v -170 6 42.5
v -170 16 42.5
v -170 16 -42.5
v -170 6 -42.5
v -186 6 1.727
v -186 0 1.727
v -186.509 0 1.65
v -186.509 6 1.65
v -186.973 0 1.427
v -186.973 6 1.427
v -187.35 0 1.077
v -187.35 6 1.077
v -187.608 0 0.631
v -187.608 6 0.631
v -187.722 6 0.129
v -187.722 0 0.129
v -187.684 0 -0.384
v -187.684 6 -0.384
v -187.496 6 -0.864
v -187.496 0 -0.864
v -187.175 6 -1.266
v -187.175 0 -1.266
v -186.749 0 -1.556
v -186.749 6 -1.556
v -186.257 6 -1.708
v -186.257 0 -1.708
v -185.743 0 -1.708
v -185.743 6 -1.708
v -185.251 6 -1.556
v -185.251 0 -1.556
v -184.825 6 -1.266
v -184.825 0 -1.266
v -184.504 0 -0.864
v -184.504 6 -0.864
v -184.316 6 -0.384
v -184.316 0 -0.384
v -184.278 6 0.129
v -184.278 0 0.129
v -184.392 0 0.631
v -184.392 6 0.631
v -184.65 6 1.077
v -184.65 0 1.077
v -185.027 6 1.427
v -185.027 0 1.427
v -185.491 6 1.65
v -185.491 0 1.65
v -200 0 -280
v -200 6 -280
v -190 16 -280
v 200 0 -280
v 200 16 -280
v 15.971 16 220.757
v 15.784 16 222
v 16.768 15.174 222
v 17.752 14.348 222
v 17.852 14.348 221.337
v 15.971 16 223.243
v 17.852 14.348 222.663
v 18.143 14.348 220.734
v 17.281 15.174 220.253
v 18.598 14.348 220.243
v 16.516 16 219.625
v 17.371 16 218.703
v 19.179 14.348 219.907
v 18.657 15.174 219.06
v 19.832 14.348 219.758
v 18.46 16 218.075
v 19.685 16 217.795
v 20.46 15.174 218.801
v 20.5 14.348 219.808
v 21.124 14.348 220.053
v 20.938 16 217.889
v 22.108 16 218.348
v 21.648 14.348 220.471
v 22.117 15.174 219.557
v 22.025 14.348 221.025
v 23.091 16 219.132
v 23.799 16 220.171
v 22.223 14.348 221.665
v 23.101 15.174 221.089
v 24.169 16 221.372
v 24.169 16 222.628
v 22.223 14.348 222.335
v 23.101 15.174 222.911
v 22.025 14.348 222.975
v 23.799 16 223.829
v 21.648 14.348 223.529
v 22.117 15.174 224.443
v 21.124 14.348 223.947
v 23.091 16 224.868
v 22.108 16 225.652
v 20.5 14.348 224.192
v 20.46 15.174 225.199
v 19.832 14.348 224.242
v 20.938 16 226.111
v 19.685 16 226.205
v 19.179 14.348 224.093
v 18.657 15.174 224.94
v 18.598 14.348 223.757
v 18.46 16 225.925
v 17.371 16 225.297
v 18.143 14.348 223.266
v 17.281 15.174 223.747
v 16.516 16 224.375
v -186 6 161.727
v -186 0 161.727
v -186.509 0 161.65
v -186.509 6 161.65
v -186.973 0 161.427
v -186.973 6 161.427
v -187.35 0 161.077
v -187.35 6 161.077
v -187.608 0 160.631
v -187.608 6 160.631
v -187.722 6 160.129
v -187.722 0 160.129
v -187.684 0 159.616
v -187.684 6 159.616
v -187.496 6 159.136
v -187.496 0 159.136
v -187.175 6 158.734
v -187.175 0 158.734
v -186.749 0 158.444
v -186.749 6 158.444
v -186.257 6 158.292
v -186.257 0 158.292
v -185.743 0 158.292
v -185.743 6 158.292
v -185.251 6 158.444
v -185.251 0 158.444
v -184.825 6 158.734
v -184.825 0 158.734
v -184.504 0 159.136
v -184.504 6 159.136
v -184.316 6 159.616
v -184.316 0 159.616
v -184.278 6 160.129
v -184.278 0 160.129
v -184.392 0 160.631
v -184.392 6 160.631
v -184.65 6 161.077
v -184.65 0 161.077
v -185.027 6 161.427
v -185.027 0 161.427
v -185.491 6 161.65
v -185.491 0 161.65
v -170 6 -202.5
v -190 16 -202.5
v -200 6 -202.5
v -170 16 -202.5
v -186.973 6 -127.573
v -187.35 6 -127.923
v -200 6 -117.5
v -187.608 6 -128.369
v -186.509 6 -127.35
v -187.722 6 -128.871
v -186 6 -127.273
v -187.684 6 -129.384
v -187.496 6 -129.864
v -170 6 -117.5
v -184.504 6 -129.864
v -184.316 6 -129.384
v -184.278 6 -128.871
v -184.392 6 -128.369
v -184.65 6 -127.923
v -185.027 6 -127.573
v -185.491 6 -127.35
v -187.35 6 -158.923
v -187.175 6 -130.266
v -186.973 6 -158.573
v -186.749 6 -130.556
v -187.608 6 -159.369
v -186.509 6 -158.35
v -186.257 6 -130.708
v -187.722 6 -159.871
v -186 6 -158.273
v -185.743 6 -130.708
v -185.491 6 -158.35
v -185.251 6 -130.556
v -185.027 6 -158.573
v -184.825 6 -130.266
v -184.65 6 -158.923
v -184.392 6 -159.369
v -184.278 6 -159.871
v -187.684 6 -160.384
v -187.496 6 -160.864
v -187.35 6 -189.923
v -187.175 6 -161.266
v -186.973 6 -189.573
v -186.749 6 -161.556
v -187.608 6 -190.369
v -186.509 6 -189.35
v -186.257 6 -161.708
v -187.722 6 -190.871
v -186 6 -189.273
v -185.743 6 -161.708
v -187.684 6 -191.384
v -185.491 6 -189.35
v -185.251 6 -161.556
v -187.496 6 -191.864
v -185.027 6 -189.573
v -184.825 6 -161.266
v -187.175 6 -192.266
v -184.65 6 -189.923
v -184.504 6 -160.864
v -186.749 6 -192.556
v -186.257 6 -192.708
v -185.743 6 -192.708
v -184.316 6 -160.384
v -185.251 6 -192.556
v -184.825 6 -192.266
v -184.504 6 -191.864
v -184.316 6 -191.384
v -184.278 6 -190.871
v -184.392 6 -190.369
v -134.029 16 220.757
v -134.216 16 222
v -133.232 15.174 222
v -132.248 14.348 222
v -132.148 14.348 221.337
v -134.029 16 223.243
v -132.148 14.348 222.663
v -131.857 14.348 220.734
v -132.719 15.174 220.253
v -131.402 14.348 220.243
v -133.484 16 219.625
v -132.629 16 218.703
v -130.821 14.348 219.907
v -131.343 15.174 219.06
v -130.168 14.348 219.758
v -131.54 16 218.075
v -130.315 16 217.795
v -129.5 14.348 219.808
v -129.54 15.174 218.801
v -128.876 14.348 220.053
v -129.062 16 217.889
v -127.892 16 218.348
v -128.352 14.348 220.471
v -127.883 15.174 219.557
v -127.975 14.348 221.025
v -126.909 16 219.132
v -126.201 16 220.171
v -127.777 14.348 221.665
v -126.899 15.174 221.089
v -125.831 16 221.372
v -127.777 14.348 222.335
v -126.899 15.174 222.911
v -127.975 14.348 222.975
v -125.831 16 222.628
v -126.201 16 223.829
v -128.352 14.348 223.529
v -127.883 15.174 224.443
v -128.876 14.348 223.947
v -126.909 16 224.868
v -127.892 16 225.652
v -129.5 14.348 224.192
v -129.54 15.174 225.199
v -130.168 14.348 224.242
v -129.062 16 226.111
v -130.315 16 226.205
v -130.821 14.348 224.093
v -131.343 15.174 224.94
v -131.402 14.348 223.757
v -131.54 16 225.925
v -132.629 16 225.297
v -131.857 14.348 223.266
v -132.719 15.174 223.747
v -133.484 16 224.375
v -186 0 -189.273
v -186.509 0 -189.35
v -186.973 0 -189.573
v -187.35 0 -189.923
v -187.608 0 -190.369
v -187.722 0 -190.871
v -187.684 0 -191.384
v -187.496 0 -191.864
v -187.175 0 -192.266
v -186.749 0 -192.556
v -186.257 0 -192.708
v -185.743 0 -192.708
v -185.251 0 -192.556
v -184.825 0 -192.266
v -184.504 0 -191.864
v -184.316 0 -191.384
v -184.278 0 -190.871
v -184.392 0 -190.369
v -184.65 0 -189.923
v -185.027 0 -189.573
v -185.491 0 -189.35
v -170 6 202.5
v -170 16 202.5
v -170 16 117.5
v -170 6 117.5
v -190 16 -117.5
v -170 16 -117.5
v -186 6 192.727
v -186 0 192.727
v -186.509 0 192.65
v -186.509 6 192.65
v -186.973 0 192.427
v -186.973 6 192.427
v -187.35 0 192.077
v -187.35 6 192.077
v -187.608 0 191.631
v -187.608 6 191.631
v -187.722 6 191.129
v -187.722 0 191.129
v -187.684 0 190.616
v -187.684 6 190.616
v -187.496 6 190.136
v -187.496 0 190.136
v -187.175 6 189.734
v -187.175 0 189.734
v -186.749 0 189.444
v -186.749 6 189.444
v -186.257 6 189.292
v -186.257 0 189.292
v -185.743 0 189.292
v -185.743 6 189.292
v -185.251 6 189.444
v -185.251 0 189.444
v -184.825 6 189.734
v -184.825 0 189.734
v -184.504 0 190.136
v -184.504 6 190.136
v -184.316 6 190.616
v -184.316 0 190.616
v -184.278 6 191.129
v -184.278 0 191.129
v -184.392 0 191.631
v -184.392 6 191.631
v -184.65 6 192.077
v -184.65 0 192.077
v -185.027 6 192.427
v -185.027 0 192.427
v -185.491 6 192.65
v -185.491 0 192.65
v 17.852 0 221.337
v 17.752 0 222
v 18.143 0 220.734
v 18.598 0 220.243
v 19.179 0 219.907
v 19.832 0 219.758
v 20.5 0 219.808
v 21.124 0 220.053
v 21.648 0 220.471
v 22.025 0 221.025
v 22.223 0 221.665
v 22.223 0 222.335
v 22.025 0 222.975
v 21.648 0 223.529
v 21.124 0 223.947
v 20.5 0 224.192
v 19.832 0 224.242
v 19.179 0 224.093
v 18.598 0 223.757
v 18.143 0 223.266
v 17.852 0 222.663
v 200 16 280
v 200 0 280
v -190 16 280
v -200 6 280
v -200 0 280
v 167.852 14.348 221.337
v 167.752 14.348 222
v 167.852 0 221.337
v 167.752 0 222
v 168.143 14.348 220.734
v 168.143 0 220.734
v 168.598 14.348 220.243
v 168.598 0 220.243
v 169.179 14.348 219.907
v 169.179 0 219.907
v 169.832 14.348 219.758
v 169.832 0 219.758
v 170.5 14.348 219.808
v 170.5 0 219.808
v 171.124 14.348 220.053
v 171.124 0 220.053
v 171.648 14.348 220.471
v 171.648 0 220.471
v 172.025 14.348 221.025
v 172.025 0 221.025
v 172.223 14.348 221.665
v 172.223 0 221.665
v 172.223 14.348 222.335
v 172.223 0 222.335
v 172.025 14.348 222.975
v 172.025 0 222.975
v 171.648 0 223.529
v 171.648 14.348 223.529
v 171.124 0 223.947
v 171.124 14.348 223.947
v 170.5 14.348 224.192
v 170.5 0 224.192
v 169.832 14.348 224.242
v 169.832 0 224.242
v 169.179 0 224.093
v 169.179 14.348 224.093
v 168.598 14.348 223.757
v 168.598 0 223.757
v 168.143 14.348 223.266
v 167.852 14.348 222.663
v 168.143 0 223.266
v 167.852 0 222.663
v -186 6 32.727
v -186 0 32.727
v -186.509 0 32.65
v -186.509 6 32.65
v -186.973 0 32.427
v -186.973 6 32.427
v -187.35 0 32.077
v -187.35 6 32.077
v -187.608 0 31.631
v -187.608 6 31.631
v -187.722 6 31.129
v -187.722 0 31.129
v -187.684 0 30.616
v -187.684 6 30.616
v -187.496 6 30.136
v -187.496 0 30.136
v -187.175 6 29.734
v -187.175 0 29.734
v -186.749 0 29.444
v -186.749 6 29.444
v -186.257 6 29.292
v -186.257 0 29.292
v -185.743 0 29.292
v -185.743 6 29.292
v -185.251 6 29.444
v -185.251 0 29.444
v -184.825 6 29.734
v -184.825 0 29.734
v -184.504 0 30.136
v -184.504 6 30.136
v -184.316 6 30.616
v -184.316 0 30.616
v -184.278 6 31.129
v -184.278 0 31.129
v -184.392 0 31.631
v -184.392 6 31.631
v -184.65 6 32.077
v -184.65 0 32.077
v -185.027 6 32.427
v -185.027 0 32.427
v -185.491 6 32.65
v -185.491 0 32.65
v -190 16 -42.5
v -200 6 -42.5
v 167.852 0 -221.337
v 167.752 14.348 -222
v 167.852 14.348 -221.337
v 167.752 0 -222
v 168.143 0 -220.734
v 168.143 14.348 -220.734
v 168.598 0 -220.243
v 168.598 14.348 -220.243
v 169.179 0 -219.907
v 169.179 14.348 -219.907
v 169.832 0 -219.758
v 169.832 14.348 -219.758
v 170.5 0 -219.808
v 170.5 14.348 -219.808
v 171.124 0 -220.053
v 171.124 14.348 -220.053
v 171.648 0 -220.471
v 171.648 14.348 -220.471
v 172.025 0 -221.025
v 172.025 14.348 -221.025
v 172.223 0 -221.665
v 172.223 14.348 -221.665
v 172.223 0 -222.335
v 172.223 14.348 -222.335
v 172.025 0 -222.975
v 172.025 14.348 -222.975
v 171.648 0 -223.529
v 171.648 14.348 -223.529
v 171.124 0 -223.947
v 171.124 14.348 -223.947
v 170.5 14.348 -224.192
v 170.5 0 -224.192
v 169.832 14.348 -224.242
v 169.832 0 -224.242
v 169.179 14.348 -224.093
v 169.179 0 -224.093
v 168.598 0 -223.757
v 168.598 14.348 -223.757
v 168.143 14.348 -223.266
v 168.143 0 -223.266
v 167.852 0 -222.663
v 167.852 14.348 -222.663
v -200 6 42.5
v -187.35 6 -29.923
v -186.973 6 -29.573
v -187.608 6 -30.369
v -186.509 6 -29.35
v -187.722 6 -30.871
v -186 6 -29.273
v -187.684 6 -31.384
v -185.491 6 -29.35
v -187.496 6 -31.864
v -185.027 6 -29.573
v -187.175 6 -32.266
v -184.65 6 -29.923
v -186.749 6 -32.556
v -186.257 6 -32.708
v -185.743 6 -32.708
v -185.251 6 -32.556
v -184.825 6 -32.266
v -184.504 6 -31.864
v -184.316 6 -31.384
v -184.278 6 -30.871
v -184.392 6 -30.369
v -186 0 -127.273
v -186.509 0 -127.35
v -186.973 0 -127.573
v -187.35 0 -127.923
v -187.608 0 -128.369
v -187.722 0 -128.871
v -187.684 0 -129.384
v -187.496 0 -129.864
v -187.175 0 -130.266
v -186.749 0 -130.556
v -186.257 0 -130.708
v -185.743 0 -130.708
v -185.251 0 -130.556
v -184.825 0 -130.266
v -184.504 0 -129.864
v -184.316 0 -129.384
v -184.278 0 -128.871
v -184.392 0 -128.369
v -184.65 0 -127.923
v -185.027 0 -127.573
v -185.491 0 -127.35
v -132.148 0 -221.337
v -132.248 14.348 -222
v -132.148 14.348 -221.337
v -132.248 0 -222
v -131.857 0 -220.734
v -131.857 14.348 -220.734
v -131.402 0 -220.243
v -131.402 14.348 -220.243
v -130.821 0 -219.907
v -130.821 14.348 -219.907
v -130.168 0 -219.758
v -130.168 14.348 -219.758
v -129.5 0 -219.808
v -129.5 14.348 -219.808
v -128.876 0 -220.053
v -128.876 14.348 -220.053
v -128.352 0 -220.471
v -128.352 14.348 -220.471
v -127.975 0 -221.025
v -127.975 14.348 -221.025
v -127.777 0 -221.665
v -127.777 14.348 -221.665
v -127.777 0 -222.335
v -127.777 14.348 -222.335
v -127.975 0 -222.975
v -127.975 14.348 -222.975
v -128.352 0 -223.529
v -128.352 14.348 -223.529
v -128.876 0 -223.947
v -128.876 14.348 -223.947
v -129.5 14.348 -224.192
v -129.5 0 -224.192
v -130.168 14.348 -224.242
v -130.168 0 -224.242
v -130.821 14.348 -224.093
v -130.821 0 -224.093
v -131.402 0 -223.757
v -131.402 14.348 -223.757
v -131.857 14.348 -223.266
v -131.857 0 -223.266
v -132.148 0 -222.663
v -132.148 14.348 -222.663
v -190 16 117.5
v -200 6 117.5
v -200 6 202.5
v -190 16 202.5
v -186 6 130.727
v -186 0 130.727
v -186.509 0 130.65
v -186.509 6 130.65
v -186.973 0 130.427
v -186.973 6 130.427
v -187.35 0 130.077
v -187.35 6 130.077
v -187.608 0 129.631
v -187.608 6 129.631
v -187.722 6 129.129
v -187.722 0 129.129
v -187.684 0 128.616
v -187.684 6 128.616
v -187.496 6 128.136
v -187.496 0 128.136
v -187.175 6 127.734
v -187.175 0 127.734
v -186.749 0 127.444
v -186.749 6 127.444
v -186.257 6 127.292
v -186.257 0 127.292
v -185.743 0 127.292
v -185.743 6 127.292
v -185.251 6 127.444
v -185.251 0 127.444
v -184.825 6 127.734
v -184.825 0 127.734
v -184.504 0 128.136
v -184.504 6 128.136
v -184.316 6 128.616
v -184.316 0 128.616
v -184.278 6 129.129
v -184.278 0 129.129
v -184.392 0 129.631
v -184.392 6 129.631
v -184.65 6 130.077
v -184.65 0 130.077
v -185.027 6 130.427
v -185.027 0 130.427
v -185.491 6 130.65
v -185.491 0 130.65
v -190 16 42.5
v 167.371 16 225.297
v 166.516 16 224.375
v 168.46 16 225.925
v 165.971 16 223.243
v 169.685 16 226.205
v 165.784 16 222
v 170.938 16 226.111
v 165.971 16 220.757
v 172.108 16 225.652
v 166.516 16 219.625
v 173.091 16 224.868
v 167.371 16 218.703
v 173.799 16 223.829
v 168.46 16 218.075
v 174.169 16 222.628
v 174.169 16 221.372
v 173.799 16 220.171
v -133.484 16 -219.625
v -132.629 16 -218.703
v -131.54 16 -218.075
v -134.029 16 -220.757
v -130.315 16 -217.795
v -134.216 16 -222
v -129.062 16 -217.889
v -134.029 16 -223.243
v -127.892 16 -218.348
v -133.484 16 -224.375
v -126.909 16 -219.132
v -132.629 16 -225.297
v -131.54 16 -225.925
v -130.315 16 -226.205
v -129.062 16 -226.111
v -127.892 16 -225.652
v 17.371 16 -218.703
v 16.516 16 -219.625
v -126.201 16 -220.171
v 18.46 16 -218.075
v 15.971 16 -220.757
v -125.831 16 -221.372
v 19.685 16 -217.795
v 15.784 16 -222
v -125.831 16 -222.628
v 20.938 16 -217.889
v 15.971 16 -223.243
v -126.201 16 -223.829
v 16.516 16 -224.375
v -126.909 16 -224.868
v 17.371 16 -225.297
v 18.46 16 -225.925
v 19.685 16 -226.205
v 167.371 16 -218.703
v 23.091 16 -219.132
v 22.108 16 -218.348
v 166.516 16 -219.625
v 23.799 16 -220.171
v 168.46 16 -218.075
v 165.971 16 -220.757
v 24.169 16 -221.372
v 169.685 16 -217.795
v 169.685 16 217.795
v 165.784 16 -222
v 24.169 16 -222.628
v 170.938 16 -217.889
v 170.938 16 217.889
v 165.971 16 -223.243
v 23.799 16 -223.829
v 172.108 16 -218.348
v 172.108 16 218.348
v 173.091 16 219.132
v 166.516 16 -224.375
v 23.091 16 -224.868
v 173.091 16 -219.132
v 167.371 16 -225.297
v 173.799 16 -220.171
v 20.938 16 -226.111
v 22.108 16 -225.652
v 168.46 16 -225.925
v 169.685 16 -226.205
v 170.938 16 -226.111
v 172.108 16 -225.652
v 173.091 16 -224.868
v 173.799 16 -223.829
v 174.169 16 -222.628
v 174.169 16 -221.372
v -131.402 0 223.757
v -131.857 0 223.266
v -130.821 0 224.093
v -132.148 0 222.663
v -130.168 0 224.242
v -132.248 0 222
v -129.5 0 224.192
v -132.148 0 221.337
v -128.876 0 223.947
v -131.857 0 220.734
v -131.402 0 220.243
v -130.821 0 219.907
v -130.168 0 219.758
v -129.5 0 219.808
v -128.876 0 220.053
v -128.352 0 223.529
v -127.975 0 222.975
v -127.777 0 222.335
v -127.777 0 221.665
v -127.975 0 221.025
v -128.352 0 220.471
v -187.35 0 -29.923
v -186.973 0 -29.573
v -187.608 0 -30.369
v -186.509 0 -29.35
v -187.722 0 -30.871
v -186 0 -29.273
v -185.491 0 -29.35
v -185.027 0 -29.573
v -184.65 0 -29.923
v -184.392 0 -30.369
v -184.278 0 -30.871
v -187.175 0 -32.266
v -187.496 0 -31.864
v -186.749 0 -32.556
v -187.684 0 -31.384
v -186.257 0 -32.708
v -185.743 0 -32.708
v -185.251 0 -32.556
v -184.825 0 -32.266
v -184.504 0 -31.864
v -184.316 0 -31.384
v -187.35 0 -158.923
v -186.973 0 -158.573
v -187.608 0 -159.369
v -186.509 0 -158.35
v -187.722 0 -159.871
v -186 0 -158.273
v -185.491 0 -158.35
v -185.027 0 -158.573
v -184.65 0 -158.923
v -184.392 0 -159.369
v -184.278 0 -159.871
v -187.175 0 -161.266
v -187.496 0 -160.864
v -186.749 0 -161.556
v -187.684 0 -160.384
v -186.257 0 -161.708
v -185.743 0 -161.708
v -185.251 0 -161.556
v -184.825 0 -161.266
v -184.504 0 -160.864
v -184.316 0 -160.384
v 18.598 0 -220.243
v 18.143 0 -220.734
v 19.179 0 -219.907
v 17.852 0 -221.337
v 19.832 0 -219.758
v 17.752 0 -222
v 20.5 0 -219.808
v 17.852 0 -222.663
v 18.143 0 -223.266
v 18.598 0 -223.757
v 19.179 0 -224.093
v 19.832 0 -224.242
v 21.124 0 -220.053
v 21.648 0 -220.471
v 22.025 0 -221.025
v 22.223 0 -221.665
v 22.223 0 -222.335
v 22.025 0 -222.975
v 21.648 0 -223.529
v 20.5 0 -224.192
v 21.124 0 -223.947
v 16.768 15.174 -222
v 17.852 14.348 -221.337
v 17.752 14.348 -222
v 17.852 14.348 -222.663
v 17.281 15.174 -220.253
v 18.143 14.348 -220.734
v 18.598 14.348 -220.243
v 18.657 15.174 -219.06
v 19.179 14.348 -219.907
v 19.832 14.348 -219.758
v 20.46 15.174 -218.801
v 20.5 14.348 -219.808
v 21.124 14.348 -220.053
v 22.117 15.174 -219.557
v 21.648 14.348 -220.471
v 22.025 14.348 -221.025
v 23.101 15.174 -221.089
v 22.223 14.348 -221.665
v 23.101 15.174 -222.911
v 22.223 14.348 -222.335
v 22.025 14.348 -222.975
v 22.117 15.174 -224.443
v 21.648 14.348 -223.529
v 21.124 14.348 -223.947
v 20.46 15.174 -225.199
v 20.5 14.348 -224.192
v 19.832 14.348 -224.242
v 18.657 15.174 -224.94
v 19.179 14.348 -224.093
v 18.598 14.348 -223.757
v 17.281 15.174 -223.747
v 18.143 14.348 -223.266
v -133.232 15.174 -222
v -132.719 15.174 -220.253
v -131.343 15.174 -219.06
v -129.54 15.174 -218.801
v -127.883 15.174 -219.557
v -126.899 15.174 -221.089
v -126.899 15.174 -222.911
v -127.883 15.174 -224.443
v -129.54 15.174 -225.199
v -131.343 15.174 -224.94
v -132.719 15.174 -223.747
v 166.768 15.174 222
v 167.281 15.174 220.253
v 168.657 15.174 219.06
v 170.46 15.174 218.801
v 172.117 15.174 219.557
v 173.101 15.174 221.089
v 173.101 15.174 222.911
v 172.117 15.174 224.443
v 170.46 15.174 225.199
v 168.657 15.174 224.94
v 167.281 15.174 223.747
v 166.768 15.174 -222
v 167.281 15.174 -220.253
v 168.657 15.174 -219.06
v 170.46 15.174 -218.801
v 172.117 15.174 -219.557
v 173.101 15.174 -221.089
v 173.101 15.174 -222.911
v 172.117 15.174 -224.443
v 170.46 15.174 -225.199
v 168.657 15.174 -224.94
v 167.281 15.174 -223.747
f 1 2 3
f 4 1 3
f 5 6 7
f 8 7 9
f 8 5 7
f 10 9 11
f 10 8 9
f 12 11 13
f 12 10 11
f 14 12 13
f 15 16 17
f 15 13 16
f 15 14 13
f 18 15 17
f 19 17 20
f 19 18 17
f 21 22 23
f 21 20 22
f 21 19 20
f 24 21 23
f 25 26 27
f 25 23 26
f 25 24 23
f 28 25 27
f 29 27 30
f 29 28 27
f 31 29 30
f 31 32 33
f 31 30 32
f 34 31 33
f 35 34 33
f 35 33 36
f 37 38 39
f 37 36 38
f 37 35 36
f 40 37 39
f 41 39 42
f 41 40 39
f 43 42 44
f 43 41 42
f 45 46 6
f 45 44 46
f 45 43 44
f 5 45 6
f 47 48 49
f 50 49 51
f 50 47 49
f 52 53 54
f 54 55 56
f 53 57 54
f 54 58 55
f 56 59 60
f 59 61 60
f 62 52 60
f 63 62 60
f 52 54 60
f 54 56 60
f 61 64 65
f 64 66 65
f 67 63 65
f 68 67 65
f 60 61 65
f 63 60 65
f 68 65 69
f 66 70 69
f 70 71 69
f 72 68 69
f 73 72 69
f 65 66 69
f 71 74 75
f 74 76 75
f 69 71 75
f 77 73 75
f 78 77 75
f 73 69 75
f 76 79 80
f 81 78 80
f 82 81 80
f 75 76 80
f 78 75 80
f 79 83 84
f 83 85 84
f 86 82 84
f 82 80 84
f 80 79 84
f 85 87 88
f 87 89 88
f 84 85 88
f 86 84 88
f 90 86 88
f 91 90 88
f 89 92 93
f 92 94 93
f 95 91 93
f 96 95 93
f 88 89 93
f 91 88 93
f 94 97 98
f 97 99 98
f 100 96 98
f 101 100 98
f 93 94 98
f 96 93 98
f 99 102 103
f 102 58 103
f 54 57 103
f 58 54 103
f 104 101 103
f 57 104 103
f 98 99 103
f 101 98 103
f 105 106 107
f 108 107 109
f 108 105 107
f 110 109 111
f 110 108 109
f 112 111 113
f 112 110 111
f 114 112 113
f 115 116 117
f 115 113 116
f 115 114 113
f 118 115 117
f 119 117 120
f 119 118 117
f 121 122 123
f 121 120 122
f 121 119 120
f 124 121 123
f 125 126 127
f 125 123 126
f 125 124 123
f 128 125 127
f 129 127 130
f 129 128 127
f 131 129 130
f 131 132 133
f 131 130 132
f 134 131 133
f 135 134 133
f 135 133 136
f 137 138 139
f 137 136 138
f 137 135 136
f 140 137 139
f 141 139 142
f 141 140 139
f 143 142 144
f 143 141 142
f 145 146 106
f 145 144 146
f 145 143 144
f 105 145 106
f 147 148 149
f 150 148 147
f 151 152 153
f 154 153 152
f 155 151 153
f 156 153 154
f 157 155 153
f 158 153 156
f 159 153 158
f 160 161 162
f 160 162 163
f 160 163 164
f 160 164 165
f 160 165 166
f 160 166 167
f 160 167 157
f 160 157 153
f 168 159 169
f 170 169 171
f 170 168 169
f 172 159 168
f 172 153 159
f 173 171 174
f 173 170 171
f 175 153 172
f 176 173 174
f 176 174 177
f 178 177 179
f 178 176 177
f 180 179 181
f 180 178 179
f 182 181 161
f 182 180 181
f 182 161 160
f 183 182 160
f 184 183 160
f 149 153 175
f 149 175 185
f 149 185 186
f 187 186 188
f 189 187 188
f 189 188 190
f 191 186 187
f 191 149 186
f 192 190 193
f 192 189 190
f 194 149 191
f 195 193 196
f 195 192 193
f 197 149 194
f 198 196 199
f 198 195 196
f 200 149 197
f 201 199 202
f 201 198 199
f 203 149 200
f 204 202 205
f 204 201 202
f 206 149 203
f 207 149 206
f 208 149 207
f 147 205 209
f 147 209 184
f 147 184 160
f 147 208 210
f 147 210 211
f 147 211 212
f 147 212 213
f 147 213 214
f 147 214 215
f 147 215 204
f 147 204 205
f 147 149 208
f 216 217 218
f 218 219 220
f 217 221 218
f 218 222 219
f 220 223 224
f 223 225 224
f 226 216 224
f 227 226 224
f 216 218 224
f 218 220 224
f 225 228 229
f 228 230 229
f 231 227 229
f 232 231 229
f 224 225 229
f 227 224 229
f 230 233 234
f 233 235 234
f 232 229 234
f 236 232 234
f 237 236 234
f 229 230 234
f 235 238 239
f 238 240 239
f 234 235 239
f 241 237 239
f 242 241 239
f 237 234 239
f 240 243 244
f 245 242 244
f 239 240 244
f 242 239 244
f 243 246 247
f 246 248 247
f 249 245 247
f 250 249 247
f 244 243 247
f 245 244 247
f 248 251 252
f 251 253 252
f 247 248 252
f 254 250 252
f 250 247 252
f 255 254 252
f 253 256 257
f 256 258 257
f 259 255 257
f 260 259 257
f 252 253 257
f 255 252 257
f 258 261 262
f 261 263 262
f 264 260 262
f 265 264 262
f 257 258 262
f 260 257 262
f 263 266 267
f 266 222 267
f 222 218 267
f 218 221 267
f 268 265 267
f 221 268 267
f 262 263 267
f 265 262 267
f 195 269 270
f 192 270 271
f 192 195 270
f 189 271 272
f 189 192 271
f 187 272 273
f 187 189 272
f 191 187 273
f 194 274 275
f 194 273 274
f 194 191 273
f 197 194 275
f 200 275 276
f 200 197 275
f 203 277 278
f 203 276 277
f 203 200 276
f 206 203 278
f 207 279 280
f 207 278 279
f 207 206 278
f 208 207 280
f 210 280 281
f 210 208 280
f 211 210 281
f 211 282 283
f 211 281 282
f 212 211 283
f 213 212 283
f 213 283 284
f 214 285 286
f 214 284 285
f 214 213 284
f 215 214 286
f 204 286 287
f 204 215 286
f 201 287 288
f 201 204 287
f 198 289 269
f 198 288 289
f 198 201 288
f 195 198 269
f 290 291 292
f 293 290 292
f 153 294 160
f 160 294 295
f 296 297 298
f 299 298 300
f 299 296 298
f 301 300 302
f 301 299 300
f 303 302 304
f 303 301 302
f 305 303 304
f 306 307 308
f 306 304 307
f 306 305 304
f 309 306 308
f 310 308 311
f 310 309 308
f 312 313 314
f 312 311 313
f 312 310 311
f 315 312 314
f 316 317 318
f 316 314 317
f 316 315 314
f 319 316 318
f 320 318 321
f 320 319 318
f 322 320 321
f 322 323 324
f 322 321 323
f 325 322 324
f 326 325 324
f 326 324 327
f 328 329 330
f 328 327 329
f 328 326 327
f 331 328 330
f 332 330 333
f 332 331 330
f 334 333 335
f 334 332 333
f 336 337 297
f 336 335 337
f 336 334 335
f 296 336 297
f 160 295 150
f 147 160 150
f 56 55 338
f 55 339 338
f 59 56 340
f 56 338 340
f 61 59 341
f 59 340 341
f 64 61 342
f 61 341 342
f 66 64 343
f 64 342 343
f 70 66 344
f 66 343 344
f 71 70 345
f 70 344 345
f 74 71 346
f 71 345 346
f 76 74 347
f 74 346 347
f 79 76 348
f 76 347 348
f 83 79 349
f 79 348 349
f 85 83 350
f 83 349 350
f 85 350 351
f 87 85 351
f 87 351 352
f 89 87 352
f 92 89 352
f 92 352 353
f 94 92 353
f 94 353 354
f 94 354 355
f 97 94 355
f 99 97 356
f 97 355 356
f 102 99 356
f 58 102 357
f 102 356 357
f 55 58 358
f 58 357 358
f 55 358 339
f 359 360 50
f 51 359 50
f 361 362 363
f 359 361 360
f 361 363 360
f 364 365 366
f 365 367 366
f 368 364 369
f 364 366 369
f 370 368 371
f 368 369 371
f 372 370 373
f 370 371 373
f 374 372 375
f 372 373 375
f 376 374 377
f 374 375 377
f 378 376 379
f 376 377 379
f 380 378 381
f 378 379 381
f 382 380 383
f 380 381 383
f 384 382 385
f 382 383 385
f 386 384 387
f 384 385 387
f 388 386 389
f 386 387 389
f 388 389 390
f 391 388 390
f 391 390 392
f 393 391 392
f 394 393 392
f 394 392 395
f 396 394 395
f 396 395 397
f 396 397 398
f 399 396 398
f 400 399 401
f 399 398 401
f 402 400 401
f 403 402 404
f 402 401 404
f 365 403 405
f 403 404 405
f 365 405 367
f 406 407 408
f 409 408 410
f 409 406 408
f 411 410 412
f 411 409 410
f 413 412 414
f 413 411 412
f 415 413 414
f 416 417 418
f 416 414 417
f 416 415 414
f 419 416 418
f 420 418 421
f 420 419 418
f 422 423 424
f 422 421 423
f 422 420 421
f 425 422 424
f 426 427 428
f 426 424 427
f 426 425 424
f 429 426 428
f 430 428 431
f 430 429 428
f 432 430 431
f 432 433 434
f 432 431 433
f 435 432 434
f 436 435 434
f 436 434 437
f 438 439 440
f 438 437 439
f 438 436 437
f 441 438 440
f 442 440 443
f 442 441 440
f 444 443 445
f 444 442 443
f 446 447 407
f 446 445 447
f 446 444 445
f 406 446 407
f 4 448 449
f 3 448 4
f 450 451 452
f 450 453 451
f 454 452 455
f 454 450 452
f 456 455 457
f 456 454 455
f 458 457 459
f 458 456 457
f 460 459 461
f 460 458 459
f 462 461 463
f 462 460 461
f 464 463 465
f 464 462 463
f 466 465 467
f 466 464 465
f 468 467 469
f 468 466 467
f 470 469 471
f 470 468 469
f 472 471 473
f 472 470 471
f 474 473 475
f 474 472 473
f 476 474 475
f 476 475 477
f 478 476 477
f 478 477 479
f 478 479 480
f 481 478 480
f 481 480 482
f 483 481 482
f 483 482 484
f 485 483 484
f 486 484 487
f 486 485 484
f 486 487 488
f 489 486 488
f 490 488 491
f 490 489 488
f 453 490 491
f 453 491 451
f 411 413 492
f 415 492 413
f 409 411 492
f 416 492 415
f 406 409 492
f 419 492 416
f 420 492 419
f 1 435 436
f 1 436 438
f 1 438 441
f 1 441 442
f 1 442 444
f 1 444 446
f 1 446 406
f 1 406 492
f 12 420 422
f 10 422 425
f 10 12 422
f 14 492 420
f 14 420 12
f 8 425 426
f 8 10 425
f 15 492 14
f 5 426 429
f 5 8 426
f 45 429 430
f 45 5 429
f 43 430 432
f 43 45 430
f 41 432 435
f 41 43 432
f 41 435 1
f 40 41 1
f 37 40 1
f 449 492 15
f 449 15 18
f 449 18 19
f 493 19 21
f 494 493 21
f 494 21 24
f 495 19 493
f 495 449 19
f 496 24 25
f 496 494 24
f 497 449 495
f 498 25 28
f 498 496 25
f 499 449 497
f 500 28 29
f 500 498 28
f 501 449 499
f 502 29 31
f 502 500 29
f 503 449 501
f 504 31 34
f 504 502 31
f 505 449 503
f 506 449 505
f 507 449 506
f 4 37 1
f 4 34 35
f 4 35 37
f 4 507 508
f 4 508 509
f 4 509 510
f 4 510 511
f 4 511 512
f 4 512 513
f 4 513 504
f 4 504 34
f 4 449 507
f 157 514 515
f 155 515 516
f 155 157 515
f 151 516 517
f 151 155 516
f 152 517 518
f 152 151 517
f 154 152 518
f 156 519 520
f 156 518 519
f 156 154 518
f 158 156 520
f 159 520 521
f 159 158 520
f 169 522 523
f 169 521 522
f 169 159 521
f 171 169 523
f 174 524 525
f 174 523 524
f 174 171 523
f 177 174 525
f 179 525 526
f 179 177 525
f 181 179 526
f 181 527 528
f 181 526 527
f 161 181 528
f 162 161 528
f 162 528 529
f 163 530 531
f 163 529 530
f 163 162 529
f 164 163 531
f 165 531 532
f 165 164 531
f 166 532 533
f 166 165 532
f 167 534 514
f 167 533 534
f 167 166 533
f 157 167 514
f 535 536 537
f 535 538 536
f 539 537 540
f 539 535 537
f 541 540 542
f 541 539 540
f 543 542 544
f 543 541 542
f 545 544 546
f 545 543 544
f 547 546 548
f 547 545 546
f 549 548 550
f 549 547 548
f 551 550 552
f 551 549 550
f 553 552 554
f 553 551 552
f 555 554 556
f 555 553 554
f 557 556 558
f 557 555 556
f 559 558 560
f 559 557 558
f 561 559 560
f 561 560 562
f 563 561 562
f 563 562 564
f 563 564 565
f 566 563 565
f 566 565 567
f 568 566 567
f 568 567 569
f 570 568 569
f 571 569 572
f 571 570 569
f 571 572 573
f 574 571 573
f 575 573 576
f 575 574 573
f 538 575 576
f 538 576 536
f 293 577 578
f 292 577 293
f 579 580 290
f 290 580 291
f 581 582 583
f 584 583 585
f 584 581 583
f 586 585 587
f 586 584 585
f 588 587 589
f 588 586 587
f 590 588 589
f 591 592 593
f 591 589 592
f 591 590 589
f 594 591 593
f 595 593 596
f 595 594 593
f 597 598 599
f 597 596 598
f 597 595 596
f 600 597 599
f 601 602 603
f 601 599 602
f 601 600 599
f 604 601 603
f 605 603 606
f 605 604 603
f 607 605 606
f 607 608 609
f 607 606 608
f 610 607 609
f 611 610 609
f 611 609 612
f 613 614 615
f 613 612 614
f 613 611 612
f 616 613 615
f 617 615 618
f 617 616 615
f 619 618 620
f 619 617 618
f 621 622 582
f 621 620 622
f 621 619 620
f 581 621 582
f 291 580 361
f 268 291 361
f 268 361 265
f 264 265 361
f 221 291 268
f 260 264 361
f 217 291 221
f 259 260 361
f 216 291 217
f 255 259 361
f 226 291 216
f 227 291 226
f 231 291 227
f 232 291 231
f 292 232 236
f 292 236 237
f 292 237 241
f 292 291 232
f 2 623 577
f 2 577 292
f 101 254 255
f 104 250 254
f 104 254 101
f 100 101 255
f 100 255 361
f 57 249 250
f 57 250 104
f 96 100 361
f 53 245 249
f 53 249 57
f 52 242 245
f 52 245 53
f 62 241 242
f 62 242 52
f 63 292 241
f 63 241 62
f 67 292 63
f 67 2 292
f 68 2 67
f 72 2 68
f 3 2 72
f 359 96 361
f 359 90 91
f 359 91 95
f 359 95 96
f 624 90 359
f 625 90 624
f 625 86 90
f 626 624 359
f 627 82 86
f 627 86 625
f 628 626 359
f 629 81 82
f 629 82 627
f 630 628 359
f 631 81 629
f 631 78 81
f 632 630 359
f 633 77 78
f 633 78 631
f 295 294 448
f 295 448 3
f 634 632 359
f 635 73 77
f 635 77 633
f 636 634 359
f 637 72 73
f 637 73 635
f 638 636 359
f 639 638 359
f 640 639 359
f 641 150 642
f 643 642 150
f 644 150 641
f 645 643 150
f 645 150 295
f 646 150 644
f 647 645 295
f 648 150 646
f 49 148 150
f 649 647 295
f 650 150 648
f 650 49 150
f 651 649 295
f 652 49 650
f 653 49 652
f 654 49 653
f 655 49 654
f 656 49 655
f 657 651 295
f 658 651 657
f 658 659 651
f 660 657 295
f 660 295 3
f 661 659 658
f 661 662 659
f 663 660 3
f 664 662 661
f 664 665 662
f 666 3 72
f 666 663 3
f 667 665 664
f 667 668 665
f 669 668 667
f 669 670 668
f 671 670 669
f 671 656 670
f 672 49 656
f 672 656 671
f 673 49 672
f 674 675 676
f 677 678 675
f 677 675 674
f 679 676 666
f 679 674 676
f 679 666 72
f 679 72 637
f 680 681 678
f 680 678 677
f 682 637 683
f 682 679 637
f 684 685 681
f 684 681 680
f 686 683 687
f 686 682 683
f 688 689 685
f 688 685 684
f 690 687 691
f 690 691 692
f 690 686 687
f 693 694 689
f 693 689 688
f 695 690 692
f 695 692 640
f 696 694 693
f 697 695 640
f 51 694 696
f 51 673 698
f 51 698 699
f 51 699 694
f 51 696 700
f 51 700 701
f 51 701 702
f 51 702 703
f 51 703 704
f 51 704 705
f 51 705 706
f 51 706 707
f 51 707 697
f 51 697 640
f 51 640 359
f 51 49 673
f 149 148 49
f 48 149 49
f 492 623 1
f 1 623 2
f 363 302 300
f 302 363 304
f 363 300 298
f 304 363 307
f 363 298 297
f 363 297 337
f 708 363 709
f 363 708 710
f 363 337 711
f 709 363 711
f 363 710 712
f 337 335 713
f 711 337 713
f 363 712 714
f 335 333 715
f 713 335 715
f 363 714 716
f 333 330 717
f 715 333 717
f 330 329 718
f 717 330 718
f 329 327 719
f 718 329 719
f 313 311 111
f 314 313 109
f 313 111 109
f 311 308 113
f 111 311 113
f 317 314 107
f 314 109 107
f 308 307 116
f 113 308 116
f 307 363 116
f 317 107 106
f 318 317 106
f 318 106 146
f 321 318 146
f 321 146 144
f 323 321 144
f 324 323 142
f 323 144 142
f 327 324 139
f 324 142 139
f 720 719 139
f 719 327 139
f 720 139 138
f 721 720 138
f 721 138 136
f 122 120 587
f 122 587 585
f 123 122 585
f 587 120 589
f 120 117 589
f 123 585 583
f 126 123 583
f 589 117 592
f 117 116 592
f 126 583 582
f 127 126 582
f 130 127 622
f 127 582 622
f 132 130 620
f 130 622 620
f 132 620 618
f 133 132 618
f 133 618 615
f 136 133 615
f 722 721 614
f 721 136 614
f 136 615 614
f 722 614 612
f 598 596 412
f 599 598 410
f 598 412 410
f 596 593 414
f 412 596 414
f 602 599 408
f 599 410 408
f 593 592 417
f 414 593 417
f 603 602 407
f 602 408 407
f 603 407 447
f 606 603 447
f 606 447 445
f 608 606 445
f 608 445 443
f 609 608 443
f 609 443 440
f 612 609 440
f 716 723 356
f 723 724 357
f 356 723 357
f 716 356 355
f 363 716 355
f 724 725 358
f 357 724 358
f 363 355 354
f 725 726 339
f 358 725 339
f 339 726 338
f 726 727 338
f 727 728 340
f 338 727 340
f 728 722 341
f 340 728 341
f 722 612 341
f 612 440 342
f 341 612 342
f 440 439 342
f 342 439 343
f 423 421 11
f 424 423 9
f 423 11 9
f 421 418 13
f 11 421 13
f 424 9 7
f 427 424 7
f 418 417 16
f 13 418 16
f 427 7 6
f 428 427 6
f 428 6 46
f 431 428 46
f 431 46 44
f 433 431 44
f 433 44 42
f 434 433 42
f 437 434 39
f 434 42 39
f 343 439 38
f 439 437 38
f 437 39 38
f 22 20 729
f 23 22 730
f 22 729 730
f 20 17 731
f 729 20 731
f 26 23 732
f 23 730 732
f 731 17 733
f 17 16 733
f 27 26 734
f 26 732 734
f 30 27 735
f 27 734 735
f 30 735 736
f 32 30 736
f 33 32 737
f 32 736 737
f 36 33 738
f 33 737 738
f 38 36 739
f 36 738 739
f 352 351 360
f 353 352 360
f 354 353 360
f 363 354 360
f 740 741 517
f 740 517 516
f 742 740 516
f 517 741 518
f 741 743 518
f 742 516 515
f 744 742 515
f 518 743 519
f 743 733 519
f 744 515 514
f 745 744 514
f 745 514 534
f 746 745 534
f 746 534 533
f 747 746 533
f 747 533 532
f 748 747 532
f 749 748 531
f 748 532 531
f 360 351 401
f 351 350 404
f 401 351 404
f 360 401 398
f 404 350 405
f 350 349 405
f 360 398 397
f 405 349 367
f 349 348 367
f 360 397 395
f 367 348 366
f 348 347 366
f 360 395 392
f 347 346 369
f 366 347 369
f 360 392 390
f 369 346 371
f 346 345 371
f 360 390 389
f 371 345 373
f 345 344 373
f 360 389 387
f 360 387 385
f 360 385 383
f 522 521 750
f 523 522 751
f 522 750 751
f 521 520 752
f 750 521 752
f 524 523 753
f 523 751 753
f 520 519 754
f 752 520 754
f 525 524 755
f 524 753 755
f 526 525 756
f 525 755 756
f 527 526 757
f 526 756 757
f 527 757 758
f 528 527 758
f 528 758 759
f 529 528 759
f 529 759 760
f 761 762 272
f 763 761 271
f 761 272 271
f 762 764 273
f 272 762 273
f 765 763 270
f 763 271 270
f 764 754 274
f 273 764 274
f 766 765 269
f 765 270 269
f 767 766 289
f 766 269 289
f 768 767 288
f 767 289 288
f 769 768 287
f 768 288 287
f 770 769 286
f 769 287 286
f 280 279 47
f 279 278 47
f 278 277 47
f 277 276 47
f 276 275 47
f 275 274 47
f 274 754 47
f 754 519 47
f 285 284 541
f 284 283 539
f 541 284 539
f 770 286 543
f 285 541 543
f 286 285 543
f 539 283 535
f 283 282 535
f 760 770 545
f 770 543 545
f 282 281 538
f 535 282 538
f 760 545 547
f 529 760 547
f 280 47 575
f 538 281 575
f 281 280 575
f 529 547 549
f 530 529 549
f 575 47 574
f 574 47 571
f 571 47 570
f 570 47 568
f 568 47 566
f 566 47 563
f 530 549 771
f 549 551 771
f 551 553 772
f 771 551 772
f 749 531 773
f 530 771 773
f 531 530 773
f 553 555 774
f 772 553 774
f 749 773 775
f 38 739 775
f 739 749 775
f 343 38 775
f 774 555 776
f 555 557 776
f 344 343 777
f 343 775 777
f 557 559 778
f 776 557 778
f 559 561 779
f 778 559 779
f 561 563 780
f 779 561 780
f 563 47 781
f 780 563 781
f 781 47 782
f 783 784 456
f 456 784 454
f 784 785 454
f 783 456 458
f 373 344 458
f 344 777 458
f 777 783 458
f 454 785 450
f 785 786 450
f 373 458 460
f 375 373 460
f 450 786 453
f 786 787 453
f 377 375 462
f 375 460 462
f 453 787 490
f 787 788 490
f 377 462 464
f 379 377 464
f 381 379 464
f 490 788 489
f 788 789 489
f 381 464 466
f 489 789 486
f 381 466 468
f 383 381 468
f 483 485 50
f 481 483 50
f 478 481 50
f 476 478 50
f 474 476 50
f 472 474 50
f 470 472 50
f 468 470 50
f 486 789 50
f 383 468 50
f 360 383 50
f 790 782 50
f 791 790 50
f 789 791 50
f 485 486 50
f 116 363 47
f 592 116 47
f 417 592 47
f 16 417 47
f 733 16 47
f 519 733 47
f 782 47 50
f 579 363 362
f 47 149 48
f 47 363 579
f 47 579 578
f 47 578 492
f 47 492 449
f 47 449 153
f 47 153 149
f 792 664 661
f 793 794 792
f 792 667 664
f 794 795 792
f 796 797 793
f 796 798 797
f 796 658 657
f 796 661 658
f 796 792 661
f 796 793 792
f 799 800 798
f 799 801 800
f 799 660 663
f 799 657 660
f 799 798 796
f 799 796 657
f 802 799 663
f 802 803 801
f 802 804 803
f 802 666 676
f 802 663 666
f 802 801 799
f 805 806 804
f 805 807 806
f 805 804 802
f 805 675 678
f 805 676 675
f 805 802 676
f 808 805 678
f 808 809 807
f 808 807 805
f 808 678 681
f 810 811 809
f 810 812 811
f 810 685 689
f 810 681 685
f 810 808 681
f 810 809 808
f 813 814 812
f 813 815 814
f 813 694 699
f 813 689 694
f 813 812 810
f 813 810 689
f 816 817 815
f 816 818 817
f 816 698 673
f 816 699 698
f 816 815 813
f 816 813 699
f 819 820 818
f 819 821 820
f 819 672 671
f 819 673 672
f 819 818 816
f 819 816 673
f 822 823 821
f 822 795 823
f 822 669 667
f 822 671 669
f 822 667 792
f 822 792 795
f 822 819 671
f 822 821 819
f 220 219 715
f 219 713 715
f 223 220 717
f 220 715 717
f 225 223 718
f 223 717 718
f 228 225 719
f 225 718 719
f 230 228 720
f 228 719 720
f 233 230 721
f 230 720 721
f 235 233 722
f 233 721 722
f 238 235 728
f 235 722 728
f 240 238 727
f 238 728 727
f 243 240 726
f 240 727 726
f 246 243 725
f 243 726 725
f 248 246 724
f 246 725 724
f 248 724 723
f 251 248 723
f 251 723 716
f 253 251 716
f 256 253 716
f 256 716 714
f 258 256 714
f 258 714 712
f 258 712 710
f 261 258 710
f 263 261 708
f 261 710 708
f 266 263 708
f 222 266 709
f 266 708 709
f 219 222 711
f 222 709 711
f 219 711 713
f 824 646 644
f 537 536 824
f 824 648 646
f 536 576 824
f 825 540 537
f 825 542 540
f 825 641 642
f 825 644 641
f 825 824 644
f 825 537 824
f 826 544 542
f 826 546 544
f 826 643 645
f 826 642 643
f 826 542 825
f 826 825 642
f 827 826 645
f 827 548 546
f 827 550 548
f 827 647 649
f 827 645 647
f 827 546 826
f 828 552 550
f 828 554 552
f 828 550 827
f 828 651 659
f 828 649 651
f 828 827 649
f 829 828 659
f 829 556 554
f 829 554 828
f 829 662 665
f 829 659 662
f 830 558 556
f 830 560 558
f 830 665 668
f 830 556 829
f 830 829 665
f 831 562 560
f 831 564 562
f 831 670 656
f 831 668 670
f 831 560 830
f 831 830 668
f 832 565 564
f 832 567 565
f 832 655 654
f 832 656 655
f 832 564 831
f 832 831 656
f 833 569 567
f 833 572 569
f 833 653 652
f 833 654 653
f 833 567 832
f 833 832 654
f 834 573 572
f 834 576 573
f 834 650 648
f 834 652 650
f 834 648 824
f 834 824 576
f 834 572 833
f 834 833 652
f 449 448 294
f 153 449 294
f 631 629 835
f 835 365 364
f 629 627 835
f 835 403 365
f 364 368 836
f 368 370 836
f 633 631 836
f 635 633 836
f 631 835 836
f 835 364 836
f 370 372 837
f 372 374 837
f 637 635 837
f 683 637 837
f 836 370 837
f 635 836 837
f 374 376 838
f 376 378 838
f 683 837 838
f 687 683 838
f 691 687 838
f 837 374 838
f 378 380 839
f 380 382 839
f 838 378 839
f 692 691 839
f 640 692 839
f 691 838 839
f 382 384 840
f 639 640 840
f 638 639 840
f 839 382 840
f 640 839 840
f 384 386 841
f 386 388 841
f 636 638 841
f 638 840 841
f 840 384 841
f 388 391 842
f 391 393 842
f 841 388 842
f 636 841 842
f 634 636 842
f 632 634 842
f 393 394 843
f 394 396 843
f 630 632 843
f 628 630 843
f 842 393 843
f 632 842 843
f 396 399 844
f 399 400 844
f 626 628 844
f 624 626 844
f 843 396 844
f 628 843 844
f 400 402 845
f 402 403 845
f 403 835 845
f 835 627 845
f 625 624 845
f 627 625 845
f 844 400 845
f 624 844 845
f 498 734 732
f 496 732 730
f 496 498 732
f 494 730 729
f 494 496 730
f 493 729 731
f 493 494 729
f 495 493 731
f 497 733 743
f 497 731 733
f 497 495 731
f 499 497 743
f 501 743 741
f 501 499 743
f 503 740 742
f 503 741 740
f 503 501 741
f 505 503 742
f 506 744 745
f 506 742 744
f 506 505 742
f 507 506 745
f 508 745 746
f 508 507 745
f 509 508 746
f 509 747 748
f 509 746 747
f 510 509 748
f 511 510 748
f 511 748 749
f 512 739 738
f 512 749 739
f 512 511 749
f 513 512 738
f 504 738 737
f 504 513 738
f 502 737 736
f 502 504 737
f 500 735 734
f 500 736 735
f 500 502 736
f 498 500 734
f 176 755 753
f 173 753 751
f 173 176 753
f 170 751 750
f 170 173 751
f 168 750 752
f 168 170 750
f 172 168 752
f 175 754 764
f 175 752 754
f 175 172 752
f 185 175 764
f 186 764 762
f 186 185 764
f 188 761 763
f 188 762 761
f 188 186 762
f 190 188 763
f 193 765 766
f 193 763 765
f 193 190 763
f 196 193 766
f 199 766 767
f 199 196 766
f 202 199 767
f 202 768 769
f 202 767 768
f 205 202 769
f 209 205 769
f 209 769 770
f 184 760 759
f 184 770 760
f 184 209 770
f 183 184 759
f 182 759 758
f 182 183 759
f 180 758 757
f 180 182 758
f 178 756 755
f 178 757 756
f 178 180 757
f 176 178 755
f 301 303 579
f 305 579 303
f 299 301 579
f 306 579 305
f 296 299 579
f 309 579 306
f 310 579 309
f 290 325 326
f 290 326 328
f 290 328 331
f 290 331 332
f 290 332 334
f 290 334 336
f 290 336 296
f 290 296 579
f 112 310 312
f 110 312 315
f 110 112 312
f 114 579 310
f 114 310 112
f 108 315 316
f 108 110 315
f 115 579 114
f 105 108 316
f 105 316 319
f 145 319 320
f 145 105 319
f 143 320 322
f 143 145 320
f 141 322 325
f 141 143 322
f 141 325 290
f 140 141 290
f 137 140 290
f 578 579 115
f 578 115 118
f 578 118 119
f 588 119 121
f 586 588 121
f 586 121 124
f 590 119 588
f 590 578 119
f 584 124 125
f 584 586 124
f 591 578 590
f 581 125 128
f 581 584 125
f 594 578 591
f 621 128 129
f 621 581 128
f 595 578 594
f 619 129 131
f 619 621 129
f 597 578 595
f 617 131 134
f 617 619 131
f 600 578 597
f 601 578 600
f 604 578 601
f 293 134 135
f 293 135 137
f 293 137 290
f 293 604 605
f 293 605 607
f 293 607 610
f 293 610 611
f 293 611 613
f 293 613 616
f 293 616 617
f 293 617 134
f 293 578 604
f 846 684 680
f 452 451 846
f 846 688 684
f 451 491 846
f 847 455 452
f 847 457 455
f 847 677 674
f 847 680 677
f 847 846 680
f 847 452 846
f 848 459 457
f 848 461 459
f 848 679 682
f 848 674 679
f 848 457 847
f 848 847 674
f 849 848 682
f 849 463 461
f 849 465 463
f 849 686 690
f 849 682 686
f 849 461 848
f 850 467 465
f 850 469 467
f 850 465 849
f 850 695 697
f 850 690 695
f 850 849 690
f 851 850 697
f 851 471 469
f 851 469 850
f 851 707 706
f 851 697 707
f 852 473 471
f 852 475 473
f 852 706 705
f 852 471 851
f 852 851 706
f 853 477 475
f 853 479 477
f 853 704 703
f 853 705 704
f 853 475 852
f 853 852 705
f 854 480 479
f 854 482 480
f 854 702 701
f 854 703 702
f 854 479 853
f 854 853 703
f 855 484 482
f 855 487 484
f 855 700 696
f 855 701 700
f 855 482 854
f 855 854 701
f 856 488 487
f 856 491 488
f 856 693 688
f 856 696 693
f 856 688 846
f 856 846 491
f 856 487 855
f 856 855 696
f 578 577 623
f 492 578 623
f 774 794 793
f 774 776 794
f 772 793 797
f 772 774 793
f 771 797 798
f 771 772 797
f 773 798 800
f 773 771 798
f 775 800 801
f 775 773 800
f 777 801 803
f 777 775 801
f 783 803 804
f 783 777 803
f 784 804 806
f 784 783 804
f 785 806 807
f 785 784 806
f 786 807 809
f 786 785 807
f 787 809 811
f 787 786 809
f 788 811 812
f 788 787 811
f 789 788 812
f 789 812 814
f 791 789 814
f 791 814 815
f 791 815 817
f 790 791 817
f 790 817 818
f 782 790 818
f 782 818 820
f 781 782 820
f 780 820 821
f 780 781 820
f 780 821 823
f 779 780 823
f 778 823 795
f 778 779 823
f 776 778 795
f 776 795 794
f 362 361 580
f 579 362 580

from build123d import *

# Parameters (mm, degrees)
SKETCH1_W                                         = 400
SKETCH1_H                                         = 560
BOSS_EXTRUDE1_DEPTH                               = 16
SKETCH2_W                                         = 30
SKETCH2_H                                         = 85
CUT_EXTRUDE1_DEPTH                                = 10
CHAMFER2_SIZE                                     = 10
F_8_36_TAPPED_HOLE1_AT_2_COUNT                    = 2
F_8_36_TAPPED_HOLE1_AT_2_PITCH                    = 31
F_8_36_TAPPED_HOLE1_AT_3_COUNT                    = 2
F_8_36_TAPPED_HOLE1_AT_3_PITCH                    = 62
LPATTERN1_COUNT                                   = 3
LPATTERN1_PITCH                                   = 160
CSK_FOR_8_FLAT_HEAD_MACHINE_SCREW_100_D           = 4.4958
CSK_FOR_8_FLAT_HEAD_MACHINE_SCREW_100_CSINK_D     = 8.4328
CSK_FOR_8_FLAT_HEAD_MACHINE_SCREW_100_CSINK_ANGLE = 100


with BuildPart() as part:
    # Sketch1 → Boss-Extrude1 (new body)
    with BuildSketch(Plane(origin=(0, 0, 0), x_dir=(1, 0, 0), z_dir=(0, 1, 0))):
        Rectangle(SKETCH1_W, SKETCH1_H)
    extrude(amount=BOSS_EXTRUDE1_DEPTH)

    # Sketch2 → Cut-Extrude1 (cut)
    with BuildSketch(Plane(origin=(0, 16, 0), x_dir=(1, 0, 0), z_dir=(0, 1, 0))):
        with Locations((-185, 160)):
            Rectangle(SKETCH2_W, SKETCH2_H)
        with Locations((-185, 0)):
            Rectangle(SKETCH2_W, SKETCH2_H)
        with Locations((-185, -160)):
            Rectangle(SKETCH2_W, SKETCH2_H)
    extrude(amount=-CUT_EXTRUDE1_DEPTH, mode=Mode.SUBTRACT)

    # Chamfer2
    chamfer2_edges = [part.edges().sort_by_distance(p)[0] for p in [
        (-200, 16, -241.25),
        (-200, 16, -80),
        (-200, 16, 80),
        (-200, 16, 241.25),
    ]]
    chamfer(chamfer2_edges, length=CHAMFER2_SIZE)

    # Sketch7 → #8-36 Tapped Hole1 (revolve, cut)
    with BuildSketch(Plane(origin=(-186, 6, 129), x_dir=(0, 0, 1), z_dir=(1, 0, 0))):
        Polygon((0, 0), (0, 26.037806461), (1.7272, 25), (1.7272, 0), align=None)
    f_8_36_tapped_hole1 = revolve(axis=Axis((-186, 12.35, 129), (0, -1, 0)), mode=Mode.SUBTRACT)

    # #8-36 Tapped Hole1 at 2: #8-36 Tapped Hole1 ×2
    with Locations(*[(0, 0, i * F_8_36_TAPPED_HOLE1_AT_2_PITCH) for i in range(1, F_8_36_TAPPED_HOLE1_AT_2_COUNT)]):
        add(f_8_36_tapped_hole1, mode=Mode.SUBTRACT)

    # #8-36 Tapped Hole1 at 3: #8-36 Tapped Hole1 ×2
    with Locations(*[(0, 0, i * F_8_36_TAPPED_HOLE1_AT_3_PITCH) for i in range(1, F_8_36_TAPPED_HOLE1_AT_3_COUNT)]):
        add(f_8_36_tapped_hole1, mode=Mode.SUBTRACT)

    # LPattern1: #8-36 Tapped Hole1 ×3
    with Locations(*[(0, 0, -i * LPATTERN1_PITCH) for i in range(1, LPATTERN1_COUNT)]):
        add(f_8_36_tapped_hole1, mode=Mode.SUBTRACT)

    # LPattern1 copy 1 sketch → LPattern1 copy 1 (revolve, cut)
    with BuildSketch(Plane(origin=(-186, 6, 0), x_dir=(0, 0, 1), z_dir=(1, 0, 0))):
        Polygon((0, 0), (0, 26.037806461), (1.7272, 25), (1.7272, 0), align=None)
    revolve(axis=Axis((-186, 12.35, 0), (0, -1, 0)), mode=Mode.SUBTRACT)

    # LPattern1 copy 2 sketch → LPattern1 copy 2 (revolve, cut)
    with BuildSketch(Plane(origin=(-186, 6, -160), x_dir=(0, 0, 1), z_dir=(1, 0, 0))):
        Polygon((0, 0), (0, 26.037806461), (1.7272, 25), (1.7272, 0), align=None)
    revolve(axis=Axis((-186, 12.35, -160), (0, -1, 0)), mode=Mode.SUBTRACT)

    # LPattern1 copy 3 sketch → LPattern1 copy 3 (revolve, cut)
    with BuildSketch(Plane(origin=(-186, 6, 31), x_dir=(0, 0, 1), z_dir=(1, 0, 0))):
        Polygon((0, 0), (0, 26.037806461), (1.7272, 25), (1.7272, 0), align=None)
    revolve(axis=Axis((-186, 12.35, 31), (0, -1, 0)), mode=Mode.SUBTRACT)

    # LPattern1 copy 4 sketch → LPattern1 copy 4 (revolve, cut)
    with BuildSketch(Plane(origin=(-186, 6, -129), x_dir=(0, 0, 1), z_dir=(1, 0, 0))):
        Polygon((0, 0), (0, 26.037806461), (1.7272, 25), (1.7272, 0), align=None)
    revolve(axis=Axis((-186, 12.35, -129), (0, -1, 0)), mode=Mode.SUBTRACT)

    # CSK for #8 Flat Head Machine Screw (100)1 (through all)
    with Locations(Plane(origin=(617.704940286, 16, 0), x_dir=(1, 0, 0), z_dir=(0, 1, 0))):
        with Locations((-447.704940286, -222), (-597.704940286, -222), (-747.704940286, -222)):
            csk_for_8_flat_head_machine_screw_100 = CounterSinkHole(CSK_FOR_8_FLAT_HEAD_MACHINE_SCREW_100_D / 2, CSK_FOR_8_FLAT_HEAD_MACHINE_SCREW_100_CSINK_D / 2, counter_sink_angle=CSK_FOR_8_FLAT_HEAD_MACHINE_SCREW_100_CSINK_ANGLE)

    # Mirror1: CSK for #8 Flat Head Machine Screw (100)1 across plane
    add(csk_for_8_flat_head_machine_screw_100.mirror(Plane.XY), mode=Mode.SUBTRACT)


solid = part.part
